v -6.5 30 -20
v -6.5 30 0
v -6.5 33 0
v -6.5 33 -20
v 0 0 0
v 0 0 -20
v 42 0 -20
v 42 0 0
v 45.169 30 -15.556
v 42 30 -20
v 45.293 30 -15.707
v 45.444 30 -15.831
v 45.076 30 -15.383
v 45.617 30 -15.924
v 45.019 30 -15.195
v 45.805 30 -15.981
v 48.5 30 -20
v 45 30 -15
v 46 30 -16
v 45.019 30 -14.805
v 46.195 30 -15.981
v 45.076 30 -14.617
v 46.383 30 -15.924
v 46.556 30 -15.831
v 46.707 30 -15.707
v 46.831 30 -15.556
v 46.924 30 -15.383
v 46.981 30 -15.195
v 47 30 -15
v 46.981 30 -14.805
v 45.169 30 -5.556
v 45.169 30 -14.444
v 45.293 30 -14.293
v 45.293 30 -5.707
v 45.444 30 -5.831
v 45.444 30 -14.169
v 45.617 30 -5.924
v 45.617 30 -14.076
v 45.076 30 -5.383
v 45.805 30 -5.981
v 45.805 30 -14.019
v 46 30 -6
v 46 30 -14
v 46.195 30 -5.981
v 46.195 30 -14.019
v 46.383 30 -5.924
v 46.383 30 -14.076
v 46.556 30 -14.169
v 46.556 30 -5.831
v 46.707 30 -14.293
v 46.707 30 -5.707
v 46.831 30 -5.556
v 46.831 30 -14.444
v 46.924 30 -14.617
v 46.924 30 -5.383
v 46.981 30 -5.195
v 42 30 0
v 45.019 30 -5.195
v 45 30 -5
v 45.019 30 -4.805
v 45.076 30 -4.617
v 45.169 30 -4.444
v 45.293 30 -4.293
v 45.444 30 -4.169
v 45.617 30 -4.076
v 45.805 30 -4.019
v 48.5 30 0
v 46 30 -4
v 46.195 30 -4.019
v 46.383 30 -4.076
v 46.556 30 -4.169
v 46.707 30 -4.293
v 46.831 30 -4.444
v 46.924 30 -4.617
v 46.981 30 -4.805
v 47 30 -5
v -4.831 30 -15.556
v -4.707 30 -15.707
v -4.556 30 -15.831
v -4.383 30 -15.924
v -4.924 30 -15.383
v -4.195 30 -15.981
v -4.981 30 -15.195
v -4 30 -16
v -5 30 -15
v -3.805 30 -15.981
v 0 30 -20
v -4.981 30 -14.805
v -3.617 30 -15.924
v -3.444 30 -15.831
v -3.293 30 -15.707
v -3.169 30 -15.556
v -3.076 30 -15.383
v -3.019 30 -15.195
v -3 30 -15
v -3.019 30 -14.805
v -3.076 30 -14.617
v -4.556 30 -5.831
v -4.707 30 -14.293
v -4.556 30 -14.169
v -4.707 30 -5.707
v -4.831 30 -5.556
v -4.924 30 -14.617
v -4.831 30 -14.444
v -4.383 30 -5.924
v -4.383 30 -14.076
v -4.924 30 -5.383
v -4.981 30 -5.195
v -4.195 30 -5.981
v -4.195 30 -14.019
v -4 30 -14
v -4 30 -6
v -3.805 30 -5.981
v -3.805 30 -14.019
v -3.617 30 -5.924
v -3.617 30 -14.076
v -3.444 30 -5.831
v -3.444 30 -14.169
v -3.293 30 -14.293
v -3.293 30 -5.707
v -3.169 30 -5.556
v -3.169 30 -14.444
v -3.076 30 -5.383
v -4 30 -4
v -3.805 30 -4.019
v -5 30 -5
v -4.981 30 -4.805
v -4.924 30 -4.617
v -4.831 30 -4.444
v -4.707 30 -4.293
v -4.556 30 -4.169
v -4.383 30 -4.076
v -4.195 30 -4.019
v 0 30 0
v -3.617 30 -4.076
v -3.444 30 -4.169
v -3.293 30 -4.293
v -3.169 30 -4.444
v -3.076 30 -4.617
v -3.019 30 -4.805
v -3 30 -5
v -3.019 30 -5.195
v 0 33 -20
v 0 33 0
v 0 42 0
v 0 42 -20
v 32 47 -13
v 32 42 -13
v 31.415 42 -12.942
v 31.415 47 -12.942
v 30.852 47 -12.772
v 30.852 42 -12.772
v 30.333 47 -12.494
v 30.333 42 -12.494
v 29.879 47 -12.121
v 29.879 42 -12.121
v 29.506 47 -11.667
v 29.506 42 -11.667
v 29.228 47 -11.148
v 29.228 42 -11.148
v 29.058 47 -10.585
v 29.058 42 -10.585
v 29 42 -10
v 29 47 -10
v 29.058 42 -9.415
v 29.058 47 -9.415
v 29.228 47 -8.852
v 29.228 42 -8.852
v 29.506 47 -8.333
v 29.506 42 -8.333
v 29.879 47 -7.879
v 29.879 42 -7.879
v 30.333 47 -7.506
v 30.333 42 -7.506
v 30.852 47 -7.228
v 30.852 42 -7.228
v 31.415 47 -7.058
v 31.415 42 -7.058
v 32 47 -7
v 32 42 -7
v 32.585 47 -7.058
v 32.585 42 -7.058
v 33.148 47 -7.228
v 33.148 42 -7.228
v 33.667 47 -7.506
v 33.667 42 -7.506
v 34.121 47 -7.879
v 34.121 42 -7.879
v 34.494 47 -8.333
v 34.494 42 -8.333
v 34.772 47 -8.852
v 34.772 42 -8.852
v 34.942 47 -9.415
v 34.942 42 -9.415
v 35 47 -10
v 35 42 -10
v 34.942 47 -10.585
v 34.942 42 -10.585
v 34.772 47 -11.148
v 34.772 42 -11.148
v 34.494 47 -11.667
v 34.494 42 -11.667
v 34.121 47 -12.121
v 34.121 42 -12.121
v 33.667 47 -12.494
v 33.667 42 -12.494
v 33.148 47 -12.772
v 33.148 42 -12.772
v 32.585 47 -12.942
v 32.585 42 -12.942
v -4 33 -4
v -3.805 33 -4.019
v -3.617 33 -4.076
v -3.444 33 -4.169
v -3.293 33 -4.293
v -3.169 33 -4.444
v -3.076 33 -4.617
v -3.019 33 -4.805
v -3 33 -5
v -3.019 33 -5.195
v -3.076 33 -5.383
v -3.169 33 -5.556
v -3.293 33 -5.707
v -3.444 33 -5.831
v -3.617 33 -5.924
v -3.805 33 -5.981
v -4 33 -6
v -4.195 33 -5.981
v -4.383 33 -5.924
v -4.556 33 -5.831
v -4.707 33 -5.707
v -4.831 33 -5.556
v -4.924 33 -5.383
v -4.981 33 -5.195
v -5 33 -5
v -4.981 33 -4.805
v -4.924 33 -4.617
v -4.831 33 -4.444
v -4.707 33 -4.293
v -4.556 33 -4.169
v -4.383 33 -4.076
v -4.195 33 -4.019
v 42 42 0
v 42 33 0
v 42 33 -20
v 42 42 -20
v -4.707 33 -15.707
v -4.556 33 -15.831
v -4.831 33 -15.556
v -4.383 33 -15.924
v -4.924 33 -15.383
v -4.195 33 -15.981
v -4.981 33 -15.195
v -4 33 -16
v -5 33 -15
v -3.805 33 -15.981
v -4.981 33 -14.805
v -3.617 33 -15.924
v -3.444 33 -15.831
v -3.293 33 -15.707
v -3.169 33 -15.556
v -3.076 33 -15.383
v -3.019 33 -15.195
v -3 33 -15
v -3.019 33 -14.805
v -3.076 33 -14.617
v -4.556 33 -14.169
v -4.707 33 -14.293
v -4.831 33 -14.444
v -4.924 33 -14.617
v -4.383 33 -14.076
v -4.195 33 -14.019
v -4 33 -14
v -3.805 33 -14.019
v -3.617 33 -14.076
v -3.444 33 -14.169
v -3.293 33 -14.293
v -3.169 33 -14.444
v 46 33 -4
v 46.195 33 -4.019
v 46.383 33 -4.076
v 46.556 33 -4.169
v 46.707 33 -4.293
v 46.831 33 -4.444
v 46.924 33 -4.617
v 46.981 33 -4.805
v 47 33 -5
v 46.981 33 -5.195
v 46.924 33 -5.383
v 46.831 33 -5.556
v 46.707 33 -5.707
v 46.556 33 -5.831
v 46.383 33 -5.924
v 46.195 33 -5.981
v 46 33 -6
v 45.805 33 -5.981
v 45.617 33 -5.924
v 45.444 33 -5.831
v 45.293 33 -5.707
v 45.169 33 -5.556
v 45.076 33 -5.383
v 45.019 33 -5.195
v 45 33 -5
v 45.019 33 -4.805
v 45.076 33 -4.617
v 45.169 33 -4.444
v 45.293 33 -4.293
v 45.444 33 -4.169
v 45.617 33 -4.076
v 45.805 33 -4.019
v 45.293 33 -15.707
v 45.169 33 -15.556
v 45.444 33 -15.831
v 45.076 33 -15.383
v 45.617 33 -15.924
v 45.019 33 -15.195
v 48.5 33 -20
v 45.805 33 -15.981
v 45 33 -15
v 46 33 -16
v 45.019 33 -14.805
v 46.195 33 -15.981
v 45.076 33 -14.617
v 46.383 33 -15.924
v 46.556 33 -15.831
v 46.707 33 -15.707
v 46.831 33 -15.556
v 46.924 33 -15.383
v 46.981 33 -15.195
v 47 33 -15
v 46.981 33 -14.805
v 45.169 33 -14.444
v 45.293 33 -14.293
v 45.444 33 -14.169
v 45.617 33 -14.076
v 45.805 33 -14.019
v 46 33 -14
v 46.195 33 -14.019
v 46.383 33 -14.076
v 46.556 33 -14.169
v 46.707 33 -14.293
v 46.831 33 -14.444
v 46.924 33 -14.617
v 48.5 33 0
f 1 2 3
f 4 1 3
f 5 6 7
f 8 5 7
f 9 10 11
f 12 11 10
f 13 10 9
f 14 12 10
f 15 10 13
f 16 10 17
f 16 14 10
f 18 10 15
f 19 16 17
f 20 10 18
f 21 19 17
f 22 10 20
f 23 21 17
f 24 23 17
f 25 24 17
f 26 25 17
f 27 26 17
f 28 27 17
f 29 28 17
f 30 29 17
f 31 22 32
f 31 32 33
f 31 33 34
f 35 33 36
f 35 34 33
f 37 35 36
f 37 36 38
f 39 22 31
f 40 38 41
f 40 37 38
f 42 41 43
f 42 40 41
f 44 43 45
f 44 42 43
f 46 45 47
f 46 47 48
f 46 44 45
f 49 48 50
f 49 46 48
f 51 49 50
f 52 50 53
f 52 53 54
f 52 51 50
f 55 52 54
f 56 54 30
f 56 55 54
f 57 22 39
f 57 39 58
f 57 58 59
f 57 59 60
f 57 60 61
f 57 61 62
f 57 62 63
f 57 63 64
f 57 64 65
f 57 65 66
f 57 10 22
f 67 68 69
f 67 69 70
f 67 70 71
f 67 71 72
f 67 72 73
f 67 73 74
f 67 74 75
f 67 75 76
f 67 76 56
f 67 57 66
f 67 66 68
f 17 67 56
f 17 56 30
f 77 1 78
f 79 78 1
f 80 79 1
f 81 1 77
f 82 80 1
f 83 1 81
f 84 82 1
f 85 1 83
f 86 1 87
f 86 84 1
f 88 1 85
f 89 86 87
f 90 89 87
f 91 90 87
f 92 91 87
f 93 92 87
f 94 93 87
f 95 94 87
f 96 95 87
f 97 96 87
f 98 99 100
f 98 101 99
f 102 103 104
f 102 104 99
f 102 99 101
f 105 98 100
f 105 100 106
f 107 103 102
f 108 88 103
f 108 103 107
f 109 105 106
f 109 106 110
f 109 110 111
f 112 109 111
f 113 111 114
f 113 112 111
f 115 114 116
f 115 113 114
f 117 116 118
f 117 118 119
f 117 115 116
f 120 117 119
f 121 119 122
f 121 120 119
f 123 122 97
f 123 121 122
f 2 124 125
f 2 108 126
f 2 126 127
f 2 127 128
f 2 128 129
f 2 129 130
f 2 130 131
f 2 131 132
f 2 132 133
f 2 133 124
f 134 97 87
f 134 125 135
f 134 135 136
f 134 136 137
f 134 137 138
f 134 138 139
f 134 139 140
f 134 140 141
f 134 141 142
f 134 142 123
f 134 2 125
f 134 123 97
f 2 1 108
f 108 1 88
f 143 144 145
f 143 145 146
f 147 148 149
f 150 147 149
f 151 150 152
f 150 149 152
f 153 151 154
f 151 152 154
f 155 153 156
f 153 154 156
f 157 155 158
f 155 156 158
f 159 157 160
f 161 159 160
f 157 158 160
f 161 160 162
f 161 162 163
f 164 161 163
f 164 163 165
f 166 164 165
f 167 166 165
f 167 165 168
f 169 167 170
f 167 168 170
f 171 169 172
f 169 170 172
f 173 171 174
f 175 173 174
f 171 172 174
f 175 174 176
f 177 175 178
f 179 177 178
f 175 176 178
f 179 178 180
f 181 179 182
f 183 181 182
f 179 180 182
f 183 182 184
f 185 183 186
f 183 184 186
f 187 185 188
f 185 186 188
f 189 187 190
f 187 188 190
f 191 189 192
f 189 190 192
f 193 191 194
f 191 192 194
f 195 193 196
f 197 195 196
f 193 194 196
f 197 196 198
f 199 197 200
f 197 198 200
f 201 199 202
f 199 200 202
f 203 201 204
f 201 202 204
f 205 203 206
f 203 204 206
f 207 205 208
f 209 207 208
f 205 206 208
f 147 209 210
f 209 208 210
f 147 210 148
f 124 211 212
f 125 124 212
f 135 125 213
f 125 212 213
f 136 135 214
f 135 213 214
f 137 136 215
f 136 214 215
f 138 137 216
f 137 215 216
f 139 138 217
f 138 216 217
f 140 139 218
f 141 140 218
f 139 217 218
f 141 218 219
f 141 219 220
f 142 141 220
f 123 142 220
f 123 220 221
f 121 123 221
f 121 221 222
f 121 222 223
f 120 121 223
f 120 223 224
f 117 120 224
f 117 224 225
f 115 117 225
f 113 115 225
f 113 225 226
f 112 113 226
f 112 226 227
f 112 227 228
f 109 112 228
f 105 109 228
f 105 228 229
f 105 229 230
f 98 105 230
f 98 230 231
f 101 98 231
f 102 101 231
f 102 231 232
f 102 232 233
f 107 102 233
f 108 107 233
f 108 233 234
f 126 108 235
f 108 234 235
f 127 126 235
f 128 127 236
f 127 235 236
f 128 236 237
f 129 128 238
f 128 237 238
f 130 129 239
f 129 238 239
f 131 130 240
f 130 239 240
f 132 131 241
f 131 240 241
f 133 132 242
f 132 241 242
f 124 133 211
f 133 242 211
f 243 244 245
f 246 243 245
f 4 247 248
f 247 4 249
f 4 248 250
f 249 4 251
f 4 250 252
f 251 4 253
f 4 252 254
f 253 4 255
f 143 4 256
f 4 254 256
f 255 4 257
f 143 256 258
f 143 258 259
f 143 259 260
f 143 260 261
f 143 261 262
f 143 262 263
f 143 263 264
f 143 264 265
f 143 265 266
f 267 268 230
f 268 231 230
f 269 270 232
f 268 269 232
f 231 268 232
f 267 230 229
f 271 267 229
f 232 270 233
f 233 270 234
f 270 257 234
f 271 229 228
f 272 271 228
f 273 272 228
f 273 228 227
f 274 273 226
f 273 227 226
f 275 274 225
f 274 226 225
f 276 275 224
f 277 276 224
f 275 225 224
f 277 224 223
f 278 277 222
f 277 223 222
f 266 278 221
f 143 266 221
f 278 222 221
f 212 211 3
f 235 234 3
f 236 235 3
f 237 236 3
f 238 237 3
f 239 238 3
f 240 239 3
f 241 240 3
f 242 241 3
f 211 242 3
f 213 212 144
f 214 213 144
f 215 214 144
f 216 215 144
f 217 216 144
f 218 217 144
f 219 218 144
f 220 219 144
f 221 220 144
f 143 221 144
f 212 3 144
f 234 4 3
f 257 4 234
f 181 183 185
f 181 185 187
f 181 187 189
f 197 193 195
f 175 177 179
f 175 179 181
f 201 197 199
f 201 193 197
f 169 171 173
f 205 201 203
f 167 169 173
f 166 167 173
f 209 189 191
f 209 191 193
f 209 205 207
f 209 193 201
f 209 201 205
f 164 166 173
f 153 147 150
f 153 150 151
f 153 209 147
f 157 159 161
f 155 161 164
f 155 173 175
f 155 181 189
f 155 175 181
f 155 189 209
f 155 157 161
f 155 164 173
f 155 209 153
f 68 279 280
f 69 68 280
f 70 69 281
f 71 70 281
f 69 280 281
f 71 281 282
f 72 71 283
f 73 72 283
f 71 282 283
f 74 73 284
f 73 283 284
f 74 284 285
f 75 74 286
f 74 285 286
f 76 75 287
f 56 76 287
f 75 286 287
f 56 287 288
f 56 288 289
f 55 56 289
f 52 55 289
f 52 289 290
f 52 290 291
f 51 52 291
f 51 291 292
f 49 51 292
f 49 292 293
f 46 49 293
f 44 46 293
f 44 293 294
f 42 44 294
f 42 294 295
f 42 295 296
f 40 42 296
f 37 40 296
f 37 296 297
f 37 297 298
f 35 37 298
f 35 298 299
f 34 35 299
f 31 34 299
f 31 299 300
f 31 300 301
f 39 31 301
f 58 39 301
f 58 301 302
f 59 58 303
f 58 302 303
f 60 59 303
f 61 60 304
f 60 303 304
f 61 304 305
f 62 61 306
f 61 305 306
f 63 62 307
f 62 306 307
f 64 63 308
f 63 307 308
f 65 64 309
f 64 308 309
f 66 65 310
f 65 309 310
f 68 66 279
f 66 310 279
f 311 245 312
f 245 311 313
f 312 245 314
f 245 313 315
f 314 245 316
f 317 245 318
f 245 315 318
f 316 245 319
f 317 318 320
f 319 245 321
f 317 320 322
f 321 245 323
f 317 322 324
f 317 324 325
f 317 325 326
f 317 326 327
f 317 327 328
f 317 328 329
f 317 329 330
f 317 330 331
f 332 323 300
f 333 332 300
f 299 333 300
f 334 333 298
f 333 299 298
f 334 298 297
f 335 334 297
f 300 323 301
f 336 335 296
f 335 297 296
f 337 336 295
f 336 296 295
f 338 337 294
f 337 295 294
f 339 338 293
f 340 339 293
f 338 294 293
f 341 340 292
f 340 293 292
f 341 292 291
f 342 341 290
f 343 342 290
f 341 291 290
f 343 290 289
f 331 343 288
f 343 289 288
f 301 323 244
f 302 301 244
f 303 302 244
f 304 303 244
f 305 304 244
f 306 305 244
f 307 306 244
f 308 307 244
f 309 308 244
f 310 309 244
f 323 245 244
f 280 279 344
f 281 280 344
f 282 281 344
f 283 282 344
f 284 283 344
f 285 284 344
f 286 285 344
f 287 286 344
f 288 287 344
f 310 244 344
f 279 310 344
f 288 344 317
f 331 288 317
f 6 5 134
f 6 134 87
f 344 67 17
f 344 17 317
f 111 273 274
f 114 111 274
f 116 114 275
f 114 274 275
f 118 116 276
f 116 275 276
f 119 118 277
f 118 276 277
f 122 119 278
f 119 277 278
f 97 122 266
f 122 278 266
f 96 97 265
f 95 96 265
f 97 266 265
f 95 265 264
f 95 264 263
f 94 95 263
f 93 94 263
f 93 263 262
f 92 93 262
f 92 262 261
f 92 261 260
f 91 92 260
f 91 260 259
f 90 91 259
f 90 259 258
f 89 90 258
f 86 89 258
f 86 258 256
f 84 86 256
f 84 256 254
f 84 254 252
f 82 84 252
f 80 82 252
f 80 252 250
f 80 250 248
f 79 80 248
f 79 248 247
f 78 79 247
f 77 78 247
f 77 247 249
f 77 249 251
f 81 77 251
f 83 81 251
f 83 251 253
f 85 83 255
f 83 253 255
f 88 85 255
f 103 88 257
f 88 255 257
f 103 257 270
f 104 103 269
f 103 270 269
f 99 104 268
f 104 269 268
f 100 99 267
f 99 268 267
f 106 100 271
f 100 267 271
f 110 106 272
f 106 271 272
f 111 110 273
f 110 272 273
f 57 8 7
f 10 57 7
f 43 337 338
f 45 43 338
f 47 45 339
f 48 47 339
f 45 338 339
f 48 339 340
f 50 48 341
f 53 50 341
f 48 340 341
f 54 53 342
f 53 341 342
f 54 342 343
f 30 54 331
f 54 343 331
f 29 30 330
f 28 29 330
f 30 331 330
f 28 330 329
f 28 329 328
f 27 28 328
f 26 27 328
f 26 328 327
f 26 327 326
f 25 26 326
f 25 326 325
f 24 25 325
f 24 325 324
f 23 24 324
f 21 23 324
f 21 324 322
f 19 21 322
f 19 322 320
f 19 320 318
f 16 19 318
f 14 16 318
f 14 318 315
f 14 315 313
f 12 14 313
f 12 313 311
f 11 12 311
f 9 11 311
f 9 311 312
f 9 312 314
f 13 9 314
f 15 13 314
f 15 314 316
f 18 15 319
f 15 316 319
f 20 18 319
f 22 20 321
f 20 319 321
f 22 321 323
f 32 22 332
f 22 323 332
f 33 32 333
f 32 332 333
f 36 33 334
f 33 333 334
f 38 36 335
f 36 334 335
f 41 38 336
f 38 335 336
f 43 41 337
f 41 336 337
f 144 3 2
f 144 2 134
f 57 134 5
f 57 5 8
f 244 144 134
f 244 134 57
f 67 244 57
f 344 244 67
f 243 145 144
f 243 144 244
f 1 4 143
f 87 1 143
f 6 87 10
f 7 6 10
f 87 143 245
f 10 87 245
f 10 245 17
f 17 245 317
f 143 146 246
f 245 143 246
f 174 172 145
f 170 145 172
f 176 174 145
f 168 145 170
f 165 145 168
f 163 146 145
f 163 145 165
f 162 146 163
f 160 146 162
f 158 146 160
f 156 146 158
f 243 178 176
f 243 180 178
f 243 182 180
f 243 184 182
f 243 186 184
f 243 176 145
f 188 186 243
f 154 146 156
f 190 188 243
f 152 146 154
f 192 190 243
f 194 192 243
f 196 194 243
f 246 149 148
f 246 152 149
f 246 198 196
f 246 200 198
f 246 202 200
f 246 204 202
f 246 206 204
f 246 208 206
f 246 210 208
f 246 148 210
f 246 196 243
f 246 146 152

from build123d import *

# Parameters (mm, degrees)
SKETCH1_W           = 42
SKETCH1_H           = 20
BOSS_EXTRUDE1_DEPTH = 42
SKETCH2_W           = 55
SKETCH2_H           = 3
BOSS_EXTRUDE2_DEPTH = 20
SKETCH3_R           = 1
CUT_EXTRUDE1_DEPTH  = 42
SKETCH4_R           = 3
BOSS_EXTRUDE3_DEPTH = 5


with BuildPart() as part:
    # Sketch1 → Boss-Extrude1 (new body)
    with BuildSketch(Plane(origin=(0, 0, 0), x_dir=(1, 0, 0), z_dir=(0, 1, 0))):
        with Locations((21, 10)):
            Rectangle(SKETCH1_W, SKETCH1_H)
    extrude(amount=BOSS_EXTRUDE1_DEPTH)

    # Sketch2 → Boss-Extrude2 (add)
    with BuildSketch(Plane.XY):
        with Locations((21, 31.5)):
            Rectangle(SKETCH2_W, SKETCH2_H)
    extrude(amount=-BOSS_EXTRUDE2_DEPTH)

    # Sketch3 → Cut-Extrude1 (cut)
    with BuildSketch(Plane(origin=(0, 33, 0), x_dir=(1, 0, 0), z_dir=(0, 1, 0))):
        with Locations(Location((-4, 15, 0), (0, 0, 270))):
            Circle(SKETCH3_R)
        with Locations(Location((-4, 5, 0), (0, 0, 270))):
            Circle(SKETCH3_R)
        with Locations(Location((46, 15, 0), (0, 0, 270))):
            Circle(SKETCH3_R)
        with Locations(Location((46, 5, 0), (0, 0, 270))):
            Circle(SKETCH3_R)
    extrude(amount=-CUT_EXTRUDE1_DEPTH, mode=Mode.SUBTRACT)

    # Sketch4 → Boss-Extrude3 (add)
    with BuildSketch(Plane(origin=(0, 42, 0), x_dir=(1, 0, 0), z_dir=(0, 1, 0))):
        with Locations(Location((32, 10, 0), (0, 0, 90))):
            Circle(SKETCH4_R)
    extrude(amount=BOSS_EXTRUDE3_DEPTH)


solid = part.part
